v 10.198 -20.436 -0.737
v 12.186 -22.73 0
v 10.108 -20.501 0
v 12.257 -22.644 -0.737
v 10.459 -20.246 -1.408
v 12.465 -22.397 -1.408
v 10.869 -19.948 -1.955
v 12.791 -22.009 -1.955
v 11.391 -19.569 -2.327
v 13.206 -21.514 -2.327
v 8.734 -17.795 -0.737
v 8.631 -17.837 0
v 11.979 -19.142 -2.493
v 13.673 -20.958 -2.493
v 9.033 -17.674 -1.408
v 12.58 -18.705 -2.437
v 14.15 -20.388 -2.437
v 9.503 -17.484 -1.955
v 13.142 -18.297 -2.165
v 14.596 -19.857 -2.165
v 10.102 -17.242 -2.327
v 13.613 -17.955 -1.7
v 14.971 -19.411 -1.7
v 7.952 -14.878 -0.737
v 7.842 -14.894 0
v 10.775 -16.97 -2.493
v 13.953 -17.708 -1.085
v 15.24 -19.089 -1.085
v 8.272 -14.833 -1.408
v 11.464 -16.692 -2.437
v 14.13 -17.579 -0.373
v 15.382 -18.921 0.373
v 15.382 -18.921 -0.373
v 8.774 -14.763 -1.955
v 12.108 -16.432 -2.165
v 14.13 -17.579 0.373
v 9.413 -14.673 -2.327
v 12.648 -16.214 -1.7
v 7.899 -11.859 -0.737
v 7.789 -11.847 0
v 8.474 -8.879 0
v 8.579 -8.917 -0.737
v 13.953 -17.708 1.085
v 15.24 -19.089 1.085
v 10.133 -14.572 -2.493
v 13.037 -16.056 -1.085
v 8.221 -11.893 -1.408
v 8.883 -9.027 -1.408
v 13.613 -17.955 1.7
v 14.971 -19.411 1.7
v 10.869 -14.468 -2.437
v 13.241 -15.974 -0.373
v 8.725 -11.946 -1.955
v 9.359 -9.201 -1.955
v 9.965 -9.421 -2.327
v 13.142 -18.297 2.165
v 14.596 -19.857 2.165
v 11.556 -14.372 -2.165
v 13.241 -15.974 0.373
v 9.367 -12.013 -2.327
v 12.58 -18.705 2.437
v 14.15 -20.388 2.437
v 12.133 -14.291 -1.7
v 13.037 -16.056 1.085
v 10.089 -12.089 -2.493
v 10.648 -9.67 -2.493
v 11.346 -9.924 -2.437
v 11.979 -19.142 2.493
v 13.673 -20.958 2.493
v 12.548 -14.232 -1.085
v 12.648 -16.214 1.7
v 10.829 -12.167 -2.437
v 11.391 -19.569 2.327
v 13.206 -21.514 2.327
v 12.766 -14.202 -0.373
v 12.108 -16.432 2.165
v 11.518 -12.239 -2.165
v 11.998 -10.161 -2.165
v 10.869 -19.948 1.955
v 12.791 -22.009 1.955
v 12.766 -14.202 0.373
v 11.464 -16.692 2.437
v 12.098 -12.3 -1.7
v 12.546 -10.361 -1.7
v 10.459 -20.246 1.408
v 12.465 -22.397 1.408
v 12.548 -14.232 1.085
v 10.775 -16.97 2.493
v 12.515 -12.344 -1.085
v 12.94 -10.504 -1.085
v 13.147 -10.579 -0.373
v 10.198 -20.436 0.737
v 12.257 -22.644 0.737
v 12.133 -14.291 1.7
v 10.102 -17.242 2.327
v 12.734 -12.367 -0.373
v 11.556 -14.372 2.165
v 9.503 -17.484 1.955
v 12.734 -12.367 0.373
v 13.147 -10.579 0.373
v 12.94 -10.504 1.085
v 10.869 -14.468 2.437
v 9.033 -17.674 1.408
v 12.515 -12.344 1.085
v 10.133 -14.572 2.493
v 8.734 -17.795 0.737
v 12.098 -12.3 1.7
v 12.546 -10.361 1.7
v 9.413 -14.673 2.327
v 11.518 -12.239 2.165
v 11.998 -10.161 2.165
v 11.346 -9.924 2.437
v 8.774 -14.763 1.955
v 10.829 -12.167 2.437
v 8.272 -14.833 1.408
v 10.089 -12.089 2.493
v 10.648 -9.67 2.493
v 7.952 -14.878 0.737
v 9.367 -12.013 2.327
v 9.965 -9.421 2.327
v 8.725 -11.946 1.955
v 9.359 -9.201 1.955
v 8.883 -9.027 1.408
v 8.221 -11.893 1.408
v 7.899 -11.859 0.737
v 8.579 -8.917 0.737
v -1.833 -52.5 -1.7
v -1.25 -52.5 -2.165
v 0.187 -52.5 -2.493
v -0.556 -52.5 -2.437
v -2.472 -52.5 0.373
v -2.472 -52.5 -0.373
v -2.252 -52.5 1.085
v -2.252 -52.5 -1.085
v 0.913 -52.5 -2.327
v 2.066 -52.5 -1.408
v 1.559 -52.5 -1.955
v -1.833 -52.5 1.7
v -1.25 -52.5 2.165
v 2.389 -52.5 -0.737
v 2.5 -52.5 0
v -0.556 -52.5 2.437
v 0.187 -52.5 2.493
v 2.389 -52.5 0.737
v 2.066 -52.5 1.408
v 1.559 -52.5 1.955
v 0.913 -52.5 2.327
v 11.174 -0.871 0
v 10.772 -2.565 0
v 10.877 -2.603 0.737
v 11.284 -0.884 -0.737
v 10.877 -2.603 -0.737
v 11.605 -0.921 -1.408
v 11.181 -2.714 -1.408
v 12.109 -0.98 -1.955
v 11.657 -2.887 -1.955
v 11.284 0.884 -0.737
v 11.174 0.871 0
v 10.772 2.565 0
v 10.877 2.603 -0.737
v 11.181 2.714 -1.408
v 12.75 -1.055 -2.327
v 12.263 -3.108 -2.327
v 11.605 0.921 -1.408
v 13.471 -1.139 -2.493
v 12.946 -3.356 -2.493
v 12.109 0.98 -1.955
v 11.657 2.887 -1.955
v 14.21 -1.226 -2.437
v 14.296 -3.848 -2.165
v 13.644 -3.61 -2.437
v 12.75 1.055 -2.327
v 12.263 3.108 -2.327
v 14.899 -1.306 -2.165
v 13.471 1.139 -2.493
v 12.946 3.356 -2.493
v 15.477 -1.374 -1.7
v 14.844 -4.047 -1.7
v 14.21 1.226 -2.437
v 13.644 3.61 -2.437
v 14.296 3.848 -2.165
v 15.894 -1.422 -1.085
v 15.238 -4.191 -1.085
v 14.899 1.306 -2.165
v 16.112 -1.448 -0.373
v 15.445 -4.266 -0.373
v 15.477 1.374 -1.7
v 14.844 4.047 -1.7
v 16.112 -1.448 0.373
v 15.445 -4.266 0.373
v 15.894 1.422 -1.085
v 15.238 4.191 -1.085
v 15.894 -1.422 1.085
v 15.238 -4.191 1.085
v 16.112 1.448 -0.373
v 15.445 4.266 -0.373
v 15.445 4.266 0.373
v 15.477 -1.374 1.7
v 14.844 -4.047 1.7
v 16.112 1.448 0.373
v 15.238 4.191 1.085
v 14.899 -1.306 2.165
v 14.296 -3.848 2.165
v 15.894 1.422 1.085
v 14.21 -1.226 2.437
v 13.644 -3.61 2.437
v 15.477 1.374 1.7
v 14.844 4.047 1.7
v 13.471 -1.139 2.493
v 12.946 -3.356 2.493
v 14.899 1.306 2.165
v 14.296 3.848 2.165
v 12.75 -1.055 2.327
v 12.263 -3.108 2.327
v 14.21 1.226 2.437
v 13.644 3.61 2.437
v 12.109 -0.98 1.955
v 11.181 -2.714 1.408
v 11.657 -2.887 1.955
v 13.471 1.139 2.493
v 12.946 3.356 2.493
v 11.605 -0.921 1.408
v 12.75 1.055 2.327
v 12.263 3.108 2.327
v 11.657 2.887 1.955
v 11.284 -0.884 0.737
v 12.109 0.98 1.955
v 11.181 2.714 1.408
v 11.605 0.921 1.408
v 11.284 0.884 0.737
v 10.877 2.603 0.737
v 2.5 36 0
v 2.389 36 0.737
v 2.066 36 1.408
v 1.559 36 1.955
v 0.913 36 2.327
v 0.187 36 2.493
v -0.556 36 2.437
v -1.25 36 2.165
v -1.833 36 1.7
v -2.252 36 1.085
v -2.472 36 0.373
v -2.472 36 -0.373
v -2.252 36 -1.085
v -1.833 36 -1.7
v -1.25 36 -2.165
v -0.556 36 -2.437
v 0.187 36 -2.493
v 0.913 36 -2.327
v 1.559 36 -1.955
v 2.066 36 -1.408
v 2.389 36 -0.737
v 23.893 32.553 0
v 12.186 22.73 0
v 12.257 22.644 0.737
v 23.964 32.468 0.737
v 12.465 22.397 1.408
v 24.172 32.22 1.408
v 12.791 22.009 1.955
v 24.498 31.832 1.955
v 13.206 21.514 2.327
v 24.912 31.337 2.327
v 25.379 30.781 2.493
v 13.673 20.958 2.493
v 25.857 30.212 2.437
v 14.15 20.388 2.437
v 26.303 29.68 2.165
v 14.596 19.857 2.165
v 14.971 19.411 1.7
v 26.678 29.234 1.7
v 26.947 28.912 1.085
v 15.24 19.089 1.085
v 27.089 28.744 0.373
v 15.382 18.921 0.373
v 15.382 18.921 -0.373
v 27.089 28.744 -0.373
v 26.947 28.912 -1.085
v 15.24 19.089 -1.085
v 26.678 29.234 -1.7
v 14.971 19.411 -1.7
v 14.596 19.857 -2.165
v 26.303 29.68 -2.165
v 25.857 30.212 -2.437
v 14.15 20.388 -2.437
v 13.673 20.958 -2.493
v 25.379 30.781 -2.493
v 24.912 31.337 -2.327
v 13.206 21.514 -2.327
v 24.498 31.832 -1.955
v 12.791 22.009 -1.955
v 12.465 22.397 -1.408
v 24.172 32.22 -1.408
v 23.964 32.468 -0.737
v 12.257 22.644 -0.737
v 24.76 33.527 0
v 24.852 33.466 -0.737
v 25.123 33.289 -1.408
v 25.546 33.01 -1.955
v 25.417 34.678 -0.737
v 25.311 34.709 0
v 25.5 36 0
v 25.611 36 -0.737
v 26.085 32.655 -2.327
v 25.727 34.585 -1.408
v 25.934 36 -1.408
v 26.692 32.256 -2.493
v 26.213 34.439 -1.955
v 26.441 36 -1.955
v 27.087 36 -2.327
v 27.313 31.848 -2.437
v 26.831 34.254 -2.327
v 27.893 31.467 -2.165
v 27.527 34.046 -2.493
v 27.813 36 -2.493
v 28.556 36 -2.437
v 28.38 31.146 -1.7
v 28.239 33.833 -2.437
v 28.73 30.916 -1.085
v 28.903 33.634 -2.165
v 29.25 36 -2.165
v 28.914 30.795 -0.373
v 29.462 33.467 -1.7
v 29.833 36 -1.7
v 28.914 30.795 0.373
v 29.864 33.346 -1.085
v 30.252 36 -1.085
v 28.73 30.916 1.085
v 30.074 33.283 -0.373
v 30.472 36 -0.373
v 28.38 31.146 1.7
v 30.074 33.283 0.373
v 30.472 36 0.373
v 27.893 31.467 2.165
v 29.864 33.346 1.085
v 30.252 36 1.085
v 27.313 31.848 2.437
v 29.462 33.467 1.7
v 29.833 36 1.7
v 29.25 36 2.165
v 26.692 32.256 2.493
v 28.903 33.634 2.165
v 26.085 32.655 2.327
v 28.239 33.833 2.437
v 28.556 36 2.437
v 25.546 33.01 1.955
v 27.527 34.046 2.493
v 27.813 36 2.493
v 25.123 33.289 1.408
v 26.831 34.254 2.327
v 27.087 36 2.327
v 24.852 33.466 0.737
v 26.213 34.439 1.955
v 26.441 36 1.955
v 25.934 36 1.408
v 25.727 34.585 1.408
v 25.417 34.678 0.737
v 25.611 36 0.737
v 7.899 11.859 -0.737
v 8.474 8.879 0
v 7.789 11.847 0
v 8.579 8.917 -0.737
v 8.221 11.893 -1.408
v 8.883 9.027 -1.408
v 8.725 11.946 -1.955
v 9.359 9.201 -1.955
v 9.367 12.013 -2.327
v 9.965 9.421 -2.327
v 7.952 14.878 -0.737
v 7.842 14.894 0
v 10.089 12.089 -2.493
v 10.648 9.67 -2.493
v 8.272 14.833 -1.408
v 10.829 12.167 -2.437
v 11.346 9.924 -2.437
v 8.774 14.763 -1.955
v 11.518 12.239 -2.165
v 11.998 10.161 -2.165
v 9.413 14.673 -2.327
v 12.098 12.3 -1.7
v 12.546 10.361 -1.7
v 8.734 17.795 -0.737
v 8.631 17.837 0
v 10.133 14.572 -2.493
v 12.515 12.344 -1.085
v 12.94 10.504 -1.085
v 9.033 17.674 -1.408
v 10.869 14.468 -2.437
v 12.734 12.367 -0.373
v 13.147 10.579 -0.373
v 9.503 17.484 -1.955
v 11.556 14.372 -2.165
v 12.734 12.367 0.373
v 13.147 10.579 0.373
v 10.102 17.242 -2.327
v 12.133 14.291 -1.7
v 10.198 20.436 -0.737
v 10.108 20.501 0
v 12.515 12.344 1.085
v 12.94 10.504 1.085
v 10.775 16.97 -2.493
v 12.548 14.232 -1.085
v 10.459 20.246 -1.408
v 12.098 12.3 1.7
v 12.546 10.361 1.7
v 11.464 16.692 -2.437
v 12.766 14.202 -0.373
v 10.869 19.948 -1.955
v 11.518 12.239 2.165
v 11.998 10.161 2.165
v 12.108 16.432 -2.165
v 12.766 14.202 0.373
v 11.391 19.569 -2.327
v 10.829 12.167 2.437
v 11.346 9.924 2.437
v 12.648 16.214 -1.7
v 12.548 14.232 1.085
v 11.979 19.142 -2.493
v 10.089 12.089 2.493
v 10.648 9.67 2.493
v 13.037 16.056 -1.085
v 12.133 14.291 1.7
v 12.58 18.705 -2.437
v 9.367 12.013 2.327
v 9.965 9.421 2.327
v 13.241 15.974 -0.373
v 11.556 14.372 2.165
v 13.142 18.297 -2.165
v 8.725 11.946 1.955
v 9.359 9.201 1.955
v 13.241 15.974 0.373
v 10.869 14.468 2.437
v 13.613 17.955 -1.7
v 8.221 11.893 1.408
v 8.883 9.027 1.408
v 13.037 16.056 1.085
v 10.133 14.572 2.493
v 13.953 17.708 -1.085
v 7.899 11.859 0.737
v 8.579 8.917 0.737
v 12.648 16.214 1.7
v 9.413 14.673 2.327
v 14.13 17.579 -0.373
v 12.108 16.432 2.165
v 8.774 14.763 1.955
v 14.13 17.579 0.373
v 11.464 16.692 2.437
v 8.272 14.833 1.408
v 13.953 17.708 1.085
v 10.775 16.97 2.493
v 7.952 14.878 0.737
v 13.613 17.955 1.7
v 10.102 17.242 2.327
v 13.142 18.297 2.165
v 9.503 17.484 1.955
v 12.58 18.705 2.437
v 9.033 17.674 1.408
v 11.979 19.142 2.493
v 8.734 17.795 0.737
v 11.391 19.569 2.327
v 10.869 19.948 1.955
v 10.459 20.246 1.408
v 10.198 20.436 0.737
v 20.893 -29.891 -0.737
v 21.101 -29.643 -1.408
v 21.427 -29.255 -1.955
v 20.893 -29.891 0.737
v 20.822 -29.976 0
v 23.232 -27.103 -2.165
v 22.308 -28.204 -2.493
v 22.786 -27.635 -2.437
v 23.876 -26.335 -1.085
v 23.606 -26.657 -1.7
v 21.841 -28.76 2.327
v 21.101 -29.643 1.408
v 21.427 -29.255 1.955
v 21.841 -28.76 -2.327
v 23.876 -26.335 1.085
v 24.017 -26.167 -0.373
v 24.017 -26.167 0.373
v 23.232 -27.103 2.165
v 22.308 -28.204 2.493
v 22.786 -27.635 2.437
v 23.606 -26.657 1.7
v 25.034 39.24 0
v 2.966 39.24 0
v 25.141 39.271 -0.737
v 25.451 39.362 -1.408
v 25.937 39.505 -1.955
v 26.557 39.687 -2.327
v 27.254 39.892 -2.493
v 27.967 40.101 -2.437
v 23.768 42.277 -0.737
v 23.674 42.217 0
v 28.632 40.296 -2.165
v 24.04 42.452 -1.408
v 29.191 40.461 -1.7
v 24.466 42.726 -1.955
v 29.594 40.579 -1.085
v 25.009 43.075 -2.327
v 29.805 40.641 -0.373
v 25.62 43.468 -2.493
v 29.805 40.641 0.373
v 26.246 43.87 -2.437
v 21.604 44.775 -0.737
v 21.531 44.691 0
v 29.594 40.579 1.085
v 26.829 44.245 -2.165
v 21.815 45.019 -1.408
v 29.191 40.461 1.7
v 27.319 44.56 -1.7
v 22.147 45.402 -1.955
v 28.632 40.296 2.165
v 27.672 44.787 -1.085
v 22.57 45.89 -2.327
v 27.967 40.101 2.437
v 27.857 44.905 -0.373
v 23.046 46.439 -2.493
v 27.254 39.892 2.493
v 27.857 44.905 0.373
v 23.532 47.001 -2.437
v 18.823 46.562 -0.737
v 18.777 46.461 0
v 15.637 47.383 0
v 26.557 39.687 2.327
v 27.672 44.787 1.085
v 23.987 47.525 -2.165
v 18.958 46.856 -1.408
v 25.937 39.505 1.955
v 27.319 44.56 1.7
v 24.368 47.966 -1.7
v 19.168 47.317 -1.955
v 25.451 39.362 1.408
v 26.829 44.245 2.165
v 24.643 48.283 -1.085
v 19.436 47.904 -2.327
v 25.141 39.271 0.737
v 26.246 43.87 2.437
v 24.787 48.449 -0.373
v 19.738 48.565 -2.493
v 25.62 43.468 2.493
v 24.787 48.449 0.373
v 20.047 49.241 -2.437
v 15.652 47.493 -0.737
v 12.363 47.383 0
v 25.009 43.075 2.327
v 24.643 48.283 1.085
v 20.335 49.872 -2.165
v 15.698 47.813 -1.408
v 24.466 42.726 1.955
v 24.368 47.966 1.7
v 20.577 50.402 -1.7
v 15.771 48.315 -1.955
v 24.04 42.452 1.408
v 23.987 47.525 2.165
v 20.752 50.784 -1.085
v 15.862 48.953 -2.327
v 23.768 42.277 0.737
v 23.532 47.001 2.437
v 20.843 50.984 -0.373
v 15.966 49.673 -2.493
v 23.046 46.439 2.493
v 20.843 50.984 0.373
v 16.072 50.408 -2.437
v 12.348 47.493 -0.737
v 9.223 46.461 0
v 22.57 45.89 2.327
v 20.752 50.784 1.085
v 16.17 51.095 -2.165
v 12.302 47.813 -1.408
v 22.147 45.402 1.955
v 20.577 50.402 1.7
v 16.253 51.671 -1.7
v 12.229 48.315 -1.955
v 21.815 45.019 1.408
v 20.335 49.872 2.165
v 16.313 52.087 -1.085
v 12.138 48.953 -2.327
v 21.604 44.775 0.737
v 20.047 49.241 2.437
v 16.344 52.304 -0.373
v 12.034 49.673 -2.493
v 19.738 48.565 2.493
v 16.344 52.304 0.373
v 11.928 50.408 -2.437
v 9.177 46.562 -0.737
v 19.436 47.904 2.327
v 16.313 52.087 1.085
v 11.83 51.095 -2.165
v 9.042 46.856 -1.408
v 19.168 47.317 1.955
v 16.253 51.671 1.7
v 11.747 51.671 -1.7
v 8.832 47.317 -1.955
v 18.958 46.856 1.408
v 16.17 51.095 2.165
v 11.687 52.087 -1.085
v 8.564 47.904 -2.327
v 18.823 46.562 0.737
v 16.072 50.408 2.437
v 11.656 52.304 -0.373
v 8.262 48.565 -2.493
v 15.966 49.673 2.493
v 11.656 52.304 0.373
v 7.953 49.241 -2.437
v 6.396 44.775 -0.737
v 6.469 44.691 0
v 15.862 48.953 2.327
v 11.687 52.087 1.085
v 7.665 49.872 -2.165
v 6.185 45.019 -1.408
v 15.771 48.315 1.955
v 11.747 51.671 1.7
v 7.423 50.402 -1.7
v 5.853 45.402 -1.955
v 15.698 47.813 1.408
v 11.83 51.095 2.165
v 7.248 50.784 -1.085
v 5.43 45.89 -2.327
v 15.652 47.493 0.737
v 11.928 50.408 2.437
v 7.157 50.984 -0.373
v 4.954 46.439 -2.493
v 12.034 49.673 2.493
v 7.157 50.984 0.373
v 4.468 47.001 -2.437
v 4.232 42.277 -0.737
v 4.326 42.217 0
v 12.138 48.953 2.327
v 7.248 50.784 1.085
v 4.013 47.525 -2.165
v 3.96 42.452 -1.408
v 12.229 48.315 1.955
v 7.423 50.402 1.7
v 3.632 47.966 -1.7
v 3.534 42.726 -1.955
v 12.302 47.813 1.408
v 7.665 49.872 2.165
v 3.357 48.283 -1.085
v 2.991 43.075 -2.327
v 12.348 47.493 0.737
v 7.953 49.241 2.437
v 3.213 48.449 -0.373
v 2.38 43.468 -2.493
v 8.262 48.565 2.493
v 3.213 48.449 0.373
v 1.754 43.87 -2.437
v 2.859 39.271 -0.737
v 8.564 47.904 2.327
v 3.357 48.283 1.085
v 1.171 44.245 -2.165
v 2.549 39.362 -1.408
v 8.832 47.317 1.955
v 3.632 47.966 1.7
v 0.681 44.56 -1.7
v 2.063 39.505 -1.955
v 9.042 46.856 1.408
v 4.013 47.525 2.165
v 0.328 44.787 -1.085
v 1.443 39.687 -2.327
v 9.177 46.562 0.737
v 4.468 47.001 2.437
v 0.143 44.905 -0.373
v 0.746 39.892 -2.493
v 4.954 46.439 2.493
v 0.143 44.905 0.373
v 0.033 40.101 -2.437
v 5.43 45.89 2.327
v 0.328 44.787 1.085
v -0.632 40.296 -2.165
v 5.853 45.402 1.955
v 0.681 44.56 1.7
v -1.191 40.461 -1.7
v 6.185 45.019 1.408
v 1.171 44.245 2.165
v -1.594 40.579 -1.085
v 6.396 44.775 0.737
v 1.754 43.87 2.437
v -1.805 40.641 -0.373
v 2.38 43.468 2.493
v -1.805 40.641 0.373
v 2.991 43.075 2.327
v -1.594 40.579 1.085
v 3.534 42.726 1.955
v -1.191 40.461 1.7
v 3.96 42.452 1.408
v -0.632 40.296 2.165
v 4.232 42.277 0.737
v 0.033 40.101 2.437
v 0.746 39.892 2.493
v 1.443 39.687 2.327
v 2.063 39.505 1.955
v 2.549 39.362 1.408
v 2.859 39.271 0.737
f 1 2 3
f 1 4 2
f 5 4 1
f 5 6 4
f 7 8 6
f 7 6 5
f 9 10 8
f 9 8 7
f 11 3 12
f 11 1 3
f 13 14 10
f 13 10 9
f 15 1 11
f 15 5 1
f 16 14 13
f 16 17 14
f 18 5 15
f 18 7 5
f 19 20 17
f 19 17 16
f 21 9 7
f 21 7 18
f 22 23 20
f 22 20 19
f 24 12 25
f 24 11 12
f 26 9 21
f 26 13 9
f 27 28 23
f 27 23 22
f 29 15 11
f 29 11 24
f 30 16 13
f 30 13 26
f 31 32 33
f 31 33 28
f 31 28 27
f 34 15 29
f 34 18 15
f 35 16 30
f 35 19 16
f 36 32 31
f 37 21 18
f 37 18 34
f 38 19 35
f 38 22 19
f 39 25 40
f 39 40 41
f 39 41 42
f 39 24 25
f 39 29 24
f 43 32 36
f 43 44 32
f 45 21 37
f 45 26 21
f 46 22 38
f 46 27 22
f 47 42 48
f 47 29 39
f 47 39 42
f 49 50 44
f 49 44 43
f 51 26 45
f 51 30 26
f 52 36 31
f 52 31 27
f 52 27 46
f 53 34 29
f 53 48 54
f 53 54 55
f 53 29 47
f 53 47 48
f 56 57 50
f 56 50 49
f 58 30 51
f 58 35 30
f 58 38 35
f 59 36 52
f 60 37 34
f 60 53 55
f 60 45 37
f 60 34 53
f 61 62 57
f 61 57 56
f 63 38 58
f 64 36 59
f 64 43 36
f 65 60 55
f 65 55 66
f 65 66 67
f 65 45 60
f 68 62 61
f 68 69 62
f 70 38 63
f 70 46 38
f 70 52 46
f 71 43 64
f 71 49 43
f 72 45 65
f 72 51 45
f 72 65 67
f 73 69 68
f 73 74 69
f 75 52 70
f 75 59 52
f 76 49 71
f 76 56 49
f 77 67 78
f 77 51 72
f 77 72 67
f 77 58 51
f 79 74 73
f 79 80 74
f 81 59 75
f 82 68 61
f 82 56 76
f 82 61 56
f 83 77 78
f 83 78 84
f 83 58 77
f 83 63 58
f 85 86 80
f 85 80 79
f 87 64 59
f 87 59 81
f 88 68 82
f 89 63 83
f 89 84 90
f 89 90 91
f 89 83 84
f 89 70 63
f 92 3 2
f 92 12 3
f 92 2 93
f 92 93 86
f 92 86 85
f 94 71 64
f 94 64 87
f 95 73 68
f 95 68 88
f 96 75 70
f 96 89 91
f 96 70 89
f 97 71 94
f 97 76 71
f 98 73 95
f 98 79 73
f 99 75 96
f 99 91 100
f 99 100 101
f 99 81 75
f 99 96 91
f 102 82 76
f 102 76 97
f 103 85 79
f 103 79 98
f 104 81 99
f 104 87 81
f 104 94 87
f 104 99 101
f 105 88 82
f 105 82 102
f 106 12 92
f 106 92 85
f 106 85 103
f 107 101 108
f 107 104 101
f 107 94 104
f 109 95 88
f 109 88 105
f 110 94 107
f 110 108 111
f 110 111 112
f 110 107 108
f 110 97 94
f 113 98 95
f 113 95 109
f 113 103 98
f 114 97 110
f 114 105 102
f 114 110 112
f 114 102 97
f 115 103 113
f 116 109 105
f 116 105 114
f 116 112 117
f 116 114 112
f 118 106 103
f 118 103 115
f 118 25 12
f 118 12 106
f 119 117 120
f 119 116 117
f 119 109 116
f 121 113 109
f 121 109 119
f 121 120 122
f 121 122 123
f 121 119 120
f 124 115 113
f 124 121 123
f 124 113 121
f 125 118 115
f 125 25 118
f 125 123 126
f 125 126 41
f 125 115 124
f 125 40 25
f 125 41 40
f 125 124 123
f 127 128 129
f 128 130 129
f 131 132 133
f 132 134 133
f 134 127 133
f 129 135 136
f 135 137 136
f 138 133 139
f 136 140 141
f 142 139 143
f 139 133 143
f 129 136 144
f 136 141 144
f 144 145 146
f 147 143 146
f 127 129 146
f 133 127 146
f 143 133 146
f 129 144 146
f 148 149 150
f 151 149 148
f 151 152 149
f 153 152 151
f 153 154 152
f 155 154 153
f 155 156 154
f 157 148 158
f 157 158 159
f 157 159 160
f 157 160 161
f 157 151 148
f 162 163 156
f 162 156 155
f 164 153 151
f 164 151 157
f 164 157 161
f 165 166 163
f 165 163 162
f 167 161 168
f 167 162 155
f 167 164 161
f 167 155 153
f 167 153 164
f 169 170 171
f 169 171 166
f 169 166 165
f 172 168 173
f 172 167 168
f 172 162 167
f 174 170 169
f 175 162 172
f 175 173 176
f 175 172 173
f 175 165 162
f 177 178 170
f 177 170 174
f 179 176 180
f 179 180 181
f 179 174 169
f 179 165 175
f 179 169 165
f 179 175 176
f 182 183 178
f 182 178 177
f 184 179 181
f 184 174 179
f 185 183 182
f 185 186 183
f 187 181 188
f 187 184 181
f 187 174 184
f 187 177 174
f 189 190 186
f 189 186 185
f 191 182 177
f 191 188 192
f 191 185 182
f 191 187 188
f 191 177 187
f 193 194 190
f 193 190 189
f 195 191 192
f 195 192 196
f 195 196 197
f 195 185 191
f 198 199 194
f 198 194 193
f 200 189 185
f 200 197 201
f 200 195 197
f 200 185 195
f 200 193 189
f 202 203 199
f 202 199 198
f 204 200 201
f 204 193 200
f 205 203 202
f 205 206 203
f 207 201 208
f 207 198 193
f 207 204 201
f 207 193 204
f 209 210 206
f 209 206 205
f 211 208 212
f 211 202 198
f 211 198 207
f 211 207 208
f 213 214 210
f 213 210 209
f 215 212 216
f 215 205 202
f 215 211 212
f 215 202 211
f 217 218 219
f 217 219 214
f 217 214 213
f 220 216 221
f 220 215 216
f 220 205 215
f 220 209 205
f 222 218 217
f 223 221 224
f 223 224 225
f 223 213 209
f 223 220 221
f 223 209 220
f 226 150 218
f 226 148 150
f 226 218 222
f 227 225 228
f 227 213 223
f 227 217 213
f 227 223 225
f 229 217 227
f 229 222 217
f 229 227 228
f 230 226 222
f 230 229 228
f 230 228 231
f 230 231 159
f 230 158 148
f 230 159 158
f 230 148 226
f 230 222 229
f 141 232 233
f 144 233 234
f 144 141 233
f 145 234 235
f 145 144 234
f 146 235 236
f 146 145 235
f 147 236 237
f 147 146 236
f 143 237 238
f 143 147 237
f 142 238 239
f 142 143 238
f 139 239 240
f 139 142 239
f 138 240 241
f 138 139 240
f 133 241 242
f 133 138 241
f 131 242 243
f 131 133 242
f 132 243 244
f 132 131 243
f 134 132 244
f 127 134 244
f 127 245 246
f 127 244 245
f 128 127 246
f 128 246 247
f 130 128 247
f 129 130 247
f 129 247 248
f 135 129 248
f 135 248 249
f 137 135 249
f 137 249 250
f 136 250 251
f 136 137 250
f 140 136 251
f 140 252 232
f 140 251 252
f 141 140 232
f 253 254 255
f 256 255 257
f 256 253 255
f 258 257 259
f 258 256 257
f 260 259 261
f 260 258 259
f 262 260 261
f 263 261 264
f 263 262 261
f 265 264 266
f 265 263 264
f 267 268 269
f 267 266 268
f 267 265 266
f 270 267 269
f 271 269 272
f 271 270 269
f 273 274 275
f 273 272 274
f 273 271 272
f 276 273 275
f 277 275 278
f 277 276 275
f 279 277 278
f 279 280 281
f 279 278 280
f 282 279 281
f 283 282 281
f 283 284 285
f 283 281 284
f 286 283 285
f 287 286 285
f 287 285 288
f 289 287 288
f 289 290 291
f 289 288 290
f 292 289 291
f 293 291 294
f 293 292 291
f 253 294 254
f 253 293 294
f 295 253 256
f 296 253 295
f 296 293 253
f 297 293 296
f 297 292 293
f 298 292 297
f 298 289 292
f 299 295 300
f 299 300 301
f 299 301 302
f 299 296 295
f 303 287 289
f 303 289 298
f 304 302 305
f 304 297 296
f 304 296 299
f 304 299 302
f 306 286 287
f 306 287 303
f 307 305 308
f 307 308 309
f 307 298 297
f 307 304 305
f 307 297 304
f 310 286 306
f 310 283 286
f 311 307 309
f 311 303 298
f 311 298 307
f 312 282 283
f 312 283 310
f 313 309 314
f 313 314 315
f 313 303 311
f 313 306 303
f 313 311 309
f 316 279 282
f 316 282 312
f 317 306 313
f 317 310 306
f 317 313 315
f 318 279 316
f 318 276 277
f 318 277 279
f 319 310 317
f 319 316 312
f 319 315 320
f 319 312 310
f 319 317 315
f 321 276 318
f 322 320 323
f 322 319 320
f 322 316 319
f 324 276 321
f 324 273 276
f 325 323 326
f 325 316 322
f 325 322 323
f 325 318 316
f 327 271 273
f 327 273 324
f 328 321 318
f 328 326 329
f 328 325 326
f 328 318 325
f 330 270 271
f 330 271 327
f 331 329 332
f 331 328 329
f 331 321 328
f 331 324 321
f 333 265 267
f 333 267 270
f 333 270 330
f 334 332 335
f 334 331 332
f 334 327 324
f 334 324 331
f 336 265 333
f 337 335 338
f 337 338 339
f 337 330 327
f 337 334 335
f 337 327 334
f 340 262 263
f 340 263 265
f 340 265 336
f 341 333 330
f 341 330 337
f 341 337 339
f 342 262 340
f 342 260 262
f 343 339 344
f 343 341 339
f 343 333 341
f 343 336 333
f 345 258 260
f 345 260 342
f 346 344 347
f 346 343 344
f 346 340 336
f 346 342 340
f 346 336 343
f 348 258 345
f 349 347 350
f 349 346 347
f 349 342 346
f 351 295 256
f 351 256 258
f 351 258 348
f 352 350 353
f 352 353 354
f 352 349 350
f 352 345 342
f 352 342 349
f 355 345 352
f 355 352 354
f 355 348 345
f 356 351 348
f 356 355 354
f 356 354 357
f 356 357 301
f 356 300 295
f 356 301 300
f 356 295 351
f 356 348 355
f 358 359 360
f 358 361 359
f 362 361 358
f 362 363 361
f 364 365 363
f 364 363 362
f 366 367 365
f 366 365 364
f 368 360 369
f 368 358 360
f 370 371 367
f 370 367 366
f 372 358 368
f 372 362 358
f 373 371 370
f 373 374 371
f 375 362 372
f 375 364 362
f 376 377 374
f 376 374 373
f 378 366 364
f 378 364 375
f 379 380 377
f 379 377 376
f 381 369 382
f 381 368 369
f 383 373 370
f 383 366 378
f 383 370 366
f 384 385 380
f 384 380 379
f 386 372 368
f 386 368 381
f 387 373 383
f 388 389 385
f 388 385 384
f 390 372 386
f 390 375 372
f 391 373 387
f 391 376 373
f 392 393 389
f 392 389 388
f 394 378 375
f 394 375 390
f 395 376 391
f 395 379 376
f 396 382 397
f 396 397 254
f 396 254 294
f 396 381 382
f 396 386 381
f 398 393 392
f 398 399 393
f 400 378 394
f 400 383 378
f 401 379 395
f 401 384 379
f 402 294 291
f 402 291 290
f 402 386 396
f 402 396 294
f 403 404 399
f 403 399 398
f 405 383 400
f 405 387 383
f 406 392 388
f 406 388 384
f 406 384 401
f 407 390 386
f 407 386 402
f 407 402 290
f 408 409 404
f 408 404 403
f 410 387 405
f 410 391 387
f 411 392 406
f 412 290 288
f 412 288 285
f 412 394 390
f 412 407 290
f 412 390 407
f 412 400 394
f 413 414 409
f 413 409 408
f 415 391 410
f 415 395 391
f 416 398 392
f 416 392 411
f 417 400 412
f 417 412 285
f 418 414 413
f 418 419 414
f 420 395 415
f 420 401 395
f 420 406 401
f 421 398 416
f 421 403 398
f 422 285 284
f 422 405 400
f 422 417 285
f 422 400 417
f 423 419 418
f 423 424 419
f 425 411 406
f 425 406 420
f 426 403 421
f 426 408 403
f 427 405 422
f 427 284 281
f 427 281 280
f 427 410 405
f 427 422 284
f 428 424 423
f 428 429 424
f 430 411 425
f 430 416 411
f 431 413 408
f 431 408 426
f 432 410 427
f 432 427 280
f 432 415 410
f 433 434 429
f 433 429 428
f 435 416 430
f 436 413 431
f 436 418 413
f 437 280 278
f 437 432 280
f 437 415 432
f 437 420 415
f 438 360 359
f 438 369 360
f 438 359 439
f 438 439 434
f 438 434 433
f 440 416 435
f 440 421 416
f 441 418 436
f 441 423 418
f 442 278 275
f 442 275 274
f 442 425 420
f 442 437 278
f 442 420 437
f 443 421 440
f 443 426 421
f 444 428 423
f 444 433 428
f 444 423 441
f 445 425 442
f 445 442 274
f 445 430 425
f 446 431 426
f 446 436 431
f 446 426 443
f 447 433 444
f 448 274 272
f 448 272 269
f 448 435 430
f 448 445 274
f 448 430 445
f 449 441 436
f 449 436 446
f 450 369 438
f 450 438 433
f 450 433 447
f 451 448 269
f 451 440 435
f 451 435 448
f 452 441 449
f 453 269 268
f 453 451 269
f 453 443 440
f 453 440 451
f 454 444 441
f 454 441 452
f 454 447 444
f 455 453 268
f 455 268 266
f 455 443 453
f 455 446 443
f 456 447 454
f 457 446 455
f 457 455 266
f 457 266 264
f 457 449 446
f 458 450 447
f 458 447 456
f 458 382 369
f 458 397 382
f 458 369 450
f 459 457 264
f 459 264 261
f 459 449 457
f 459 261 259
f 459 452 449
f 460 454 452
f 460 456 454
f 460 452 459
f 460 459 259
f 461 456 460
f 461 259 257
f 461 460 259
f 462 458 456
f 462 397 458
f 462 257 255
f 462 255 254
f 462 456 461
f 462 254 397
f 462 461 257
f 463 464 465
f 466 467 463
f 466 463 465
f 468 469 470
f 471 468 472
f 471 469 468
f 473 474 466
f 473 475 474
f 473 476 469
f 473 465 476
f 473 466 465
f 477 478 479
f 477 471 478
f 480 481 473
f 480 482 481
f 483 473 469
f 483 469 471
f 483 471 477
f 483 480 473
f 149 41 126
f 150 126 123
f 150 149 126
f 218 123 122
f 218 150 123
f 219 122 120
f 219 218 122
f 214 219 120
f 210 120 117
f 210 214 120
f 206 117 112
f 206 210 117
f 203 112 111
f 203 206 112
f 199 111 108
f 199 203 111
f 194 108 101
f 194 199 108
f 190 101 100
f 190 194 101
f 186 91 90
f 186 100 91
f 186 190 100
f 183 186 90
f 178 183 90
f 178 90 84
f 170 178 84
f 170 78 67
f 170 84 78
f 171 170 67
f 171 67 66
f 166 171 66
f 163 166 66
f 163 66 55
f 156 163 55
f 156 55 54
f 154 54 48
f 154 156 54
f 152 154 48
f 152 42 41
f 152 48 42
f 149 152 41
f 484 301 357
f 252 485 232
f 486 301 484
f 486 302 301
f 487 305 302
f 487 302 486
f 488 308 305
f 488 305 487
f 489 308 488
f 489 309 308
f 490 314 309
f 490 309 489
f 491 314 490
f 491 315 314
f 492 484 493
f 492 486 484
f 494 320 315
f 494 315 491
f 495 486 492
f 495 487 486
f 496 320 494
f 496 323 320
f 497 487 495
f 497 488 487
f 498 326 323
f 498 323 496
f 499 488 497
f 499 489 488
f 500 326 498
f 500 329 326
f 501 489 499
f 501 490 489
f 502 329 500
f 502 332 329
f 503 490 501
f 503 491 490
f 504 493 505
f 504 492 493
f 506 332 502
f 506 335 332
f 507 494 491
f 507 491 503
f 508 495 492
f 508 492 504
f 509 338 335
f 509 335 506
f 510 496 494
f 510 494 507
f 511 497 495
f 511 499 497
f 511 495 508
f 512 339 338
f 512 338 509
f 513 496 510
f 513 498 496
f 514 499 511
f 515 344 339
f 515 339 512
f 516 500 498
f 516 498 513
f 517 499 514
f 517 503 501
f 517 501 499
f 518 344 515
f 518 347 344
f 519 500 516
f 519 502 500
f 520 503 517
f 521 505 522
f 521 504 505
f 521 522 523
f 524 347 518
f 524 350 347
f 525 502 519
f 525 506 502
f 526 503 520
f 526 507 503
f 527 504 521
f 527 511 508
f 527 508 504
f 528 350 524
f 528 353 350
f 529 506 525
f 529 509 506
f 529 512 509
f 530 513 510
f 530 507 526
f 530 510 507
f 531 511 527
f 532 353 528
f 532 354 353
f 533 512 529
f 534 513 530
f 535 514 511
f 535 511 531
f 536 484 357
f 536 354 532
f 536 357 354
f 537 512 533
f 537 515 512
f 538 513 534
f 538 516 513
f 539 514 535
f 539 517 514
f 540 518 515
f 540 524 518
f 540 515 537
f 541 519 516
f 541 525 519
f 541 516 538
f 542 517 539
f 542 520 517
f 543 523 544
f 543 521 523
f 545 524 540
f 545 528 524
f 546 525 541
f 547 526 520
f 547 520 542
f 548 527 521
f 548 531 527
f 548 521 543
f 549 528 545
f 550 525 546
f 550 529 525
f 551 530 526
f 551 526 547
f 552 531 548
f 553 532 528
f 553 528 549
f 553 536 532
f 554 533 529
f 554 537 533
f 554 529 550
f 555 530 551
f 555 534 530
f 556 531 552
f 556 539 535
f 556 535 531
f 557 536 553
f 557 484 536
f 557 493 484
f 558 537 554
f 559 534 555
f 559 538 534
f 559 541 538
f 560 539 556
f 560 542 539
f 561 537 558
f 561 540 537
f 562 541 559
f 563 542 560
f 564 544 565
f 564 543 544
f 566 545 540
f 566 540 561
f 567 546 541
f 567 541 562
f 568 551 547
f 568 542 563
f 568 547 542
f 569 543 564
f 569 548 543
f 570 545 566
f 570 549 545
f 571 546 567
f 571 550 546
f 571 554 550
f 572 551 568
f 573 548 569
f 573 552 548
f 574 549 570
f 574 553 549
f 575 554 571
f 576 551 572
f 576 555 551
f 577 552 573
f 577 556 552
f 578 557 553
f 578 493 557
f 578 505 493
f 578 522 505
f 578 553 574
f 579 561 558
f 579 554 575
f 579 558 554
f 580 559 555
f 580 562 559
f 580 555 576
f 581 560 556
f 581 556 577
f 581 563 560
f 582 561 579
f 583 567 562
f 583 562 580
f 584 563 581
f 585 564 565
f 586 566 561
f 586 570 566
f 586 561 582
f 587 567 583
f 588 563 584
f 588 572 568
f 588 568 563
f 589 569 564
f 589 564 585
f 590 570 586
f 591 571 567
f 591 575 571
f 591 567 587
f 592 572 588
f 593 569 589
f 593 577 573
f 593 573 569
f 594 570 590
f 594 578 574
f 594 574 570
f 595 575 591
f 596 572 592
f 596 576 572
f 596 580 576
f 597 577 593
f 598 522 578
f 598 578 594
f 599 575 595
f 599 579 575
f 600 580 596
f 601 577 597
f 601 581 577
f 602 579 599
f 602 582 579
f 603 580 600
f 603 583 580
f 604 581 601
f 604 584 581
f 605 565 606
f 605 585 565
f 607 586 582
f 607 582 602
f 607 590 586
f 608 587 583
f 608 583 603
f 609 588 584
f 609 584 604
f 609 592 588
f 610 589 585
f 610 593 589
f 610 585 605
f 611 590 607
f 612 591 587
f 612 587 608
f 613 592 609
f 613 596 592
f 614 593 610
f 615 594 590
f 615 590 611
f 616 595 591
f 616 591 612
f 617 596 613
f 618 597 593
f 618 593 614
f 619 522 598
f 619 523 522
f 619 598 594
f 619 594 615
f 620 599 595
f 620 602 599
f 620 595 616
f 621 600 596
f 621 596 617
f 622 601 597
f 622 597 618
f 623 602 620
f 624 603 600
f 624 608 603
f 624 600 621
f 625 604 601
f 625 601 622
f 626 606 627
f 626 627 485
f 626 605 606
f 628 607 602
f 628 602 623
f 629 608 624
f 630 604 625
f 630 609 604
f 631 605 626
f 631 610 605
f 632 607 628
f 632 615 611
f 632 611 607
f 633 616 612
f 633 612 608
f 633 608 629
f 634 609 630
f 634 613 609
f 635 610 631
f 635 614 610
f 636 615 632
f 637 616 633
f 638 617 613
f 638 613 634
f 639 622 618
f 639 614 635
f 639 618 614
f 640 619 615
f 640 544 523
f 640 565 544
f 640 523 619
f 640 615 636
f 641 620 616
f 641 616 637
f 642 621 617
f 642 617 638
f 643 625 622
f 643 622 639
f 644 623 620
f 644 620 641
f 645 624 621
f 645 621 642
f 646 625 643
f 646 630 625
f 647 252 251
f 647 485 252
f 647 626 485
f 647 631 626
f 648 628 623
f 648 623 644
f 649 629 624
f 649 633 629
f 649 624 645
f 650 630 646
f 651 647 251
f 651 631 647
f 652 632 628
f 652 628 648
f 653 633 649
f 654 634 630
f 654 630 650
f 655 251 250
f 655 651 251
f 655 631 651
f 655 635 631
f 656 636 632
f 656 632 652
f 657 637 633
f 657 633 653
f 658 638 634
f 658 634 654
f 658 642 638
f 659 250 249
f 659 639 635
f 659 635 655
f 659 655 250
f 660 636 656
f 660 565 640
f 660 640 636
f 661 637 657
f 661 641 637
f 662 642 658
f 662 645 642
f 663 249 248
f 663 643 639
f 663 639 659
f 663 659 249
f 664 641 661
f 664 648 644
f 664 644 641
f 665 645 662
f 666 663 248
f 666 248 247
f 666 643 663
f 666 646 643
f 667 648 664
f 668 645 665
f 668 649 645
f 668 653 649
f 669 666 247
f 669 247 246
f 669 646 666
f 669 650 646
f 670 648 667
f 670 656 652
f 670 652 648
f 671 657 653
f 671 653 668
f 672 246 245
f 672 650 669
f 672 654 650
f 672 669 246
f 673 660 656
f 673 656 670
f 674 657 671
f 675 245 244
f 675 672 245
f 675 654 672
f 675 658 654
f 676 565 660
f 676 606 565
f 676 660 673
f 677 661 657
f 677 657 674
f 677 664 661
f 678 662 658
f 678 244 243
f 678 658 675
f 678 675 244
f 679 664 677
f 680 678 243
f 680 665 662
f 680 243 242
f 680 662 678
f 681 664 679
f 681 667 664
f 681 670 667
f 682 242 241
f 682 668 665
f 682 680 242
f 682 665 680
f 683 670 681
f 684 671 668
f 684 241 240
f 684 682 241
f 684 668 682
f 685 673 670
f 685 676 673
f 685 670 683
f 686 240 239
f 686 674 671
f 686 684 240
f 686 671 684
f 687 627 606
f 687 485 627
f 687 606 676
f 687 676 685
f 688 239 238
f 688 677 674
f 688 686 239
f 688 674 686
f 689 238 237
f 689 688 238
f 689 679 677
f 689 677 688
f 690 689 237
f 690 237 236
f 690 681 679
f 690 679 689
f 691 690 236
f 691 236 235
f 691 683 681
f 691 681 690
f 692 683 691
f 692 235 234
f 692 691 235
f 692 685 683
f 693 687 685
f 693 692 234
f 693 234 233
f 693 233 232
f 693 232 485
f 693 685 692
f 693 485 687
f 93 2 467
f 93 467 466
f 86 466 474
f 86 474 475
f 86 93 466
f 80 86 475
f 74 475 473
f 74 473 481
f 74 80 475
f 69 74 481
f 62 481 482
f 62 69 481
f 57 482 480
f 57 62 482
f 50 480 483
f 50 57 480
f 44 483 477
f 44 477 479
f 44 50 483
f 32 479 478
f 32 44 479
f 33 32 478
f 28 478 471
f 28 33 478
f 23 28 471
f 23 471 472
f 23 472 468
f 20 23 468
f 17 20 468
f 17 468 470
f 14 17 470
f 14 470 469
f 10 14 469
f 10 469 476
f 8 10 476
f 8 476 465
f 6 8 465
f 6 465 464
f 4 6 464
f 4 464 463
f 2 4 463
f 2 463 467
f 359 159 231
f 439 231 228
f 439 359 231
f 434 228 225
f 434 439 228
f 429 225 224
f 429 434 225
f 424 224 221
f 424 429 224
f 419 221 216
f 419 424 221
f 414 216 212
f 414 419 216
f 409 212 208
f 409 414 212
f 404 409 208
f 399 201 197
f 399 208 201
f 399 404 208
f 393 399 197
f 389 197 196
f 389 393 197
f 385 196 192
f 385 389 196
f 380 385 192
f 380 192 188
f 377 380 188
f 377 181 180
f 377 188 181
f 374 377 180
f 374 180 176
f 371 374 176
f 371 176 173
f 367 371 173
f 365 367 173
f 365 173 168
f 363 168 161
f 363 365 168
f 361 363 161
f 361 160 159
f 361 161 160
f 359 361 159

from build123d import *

# Parameters (mm, degrees)
SZKIC1_R = 2.5


with BuildPart() as part:
    # Wyciągnięcie po ścieżce1: sweep along a path in Szkic2
    with BuildLine(Plane.XY) as wyci_gni_cie_po_cie_ce1_path:
        Line((20.821502931, -29.975890373), (12.185665565, -22.729562424))
        ThreePointArc((12.185665565, -22.729562424), (8.146437857, -16.389244949), (8.474352926, -8.878755094))
        Line((8.474352926, -8.878755094), (10.77231686, -2.565151075))
        ThreePointArc((10.77231686, -2.565151075), (11.224622204, 0), (10.77231686, 2.565151075))
        Line((10.77231686, 2.565151075), (8.474352926, 8.878755094))
        ThreePointArc((8.474352926, 8.878755094), (8.146437857, 16.389244949), (12.185665565, 22.729562424))
        Line((12.185665565, 22.729562424), (23.892544244, 32.552800006))
        ThreePointArc((23.892544244, 32.552800006), (25.078385042, 34.098217822), (25.5, 36))
        ThreePointArc((25.5, 36), (14, 47.5), (2.5, 36))
        Line((2.5, 36), (2.5, -52.5))
    # Szkic1 → Wyciągnięcie po ścieżce1 (sweep)
    with BuildSketch(Plane(origin=(0, -52.5, 0), x_dir=(1, 0, 0), z_dir=(0, 1, 0))):
        Circle(SZKIC1_R)
    sweep(path=wyci_gni_cie_po_cie_ce1_path.line)


solid = part.part
